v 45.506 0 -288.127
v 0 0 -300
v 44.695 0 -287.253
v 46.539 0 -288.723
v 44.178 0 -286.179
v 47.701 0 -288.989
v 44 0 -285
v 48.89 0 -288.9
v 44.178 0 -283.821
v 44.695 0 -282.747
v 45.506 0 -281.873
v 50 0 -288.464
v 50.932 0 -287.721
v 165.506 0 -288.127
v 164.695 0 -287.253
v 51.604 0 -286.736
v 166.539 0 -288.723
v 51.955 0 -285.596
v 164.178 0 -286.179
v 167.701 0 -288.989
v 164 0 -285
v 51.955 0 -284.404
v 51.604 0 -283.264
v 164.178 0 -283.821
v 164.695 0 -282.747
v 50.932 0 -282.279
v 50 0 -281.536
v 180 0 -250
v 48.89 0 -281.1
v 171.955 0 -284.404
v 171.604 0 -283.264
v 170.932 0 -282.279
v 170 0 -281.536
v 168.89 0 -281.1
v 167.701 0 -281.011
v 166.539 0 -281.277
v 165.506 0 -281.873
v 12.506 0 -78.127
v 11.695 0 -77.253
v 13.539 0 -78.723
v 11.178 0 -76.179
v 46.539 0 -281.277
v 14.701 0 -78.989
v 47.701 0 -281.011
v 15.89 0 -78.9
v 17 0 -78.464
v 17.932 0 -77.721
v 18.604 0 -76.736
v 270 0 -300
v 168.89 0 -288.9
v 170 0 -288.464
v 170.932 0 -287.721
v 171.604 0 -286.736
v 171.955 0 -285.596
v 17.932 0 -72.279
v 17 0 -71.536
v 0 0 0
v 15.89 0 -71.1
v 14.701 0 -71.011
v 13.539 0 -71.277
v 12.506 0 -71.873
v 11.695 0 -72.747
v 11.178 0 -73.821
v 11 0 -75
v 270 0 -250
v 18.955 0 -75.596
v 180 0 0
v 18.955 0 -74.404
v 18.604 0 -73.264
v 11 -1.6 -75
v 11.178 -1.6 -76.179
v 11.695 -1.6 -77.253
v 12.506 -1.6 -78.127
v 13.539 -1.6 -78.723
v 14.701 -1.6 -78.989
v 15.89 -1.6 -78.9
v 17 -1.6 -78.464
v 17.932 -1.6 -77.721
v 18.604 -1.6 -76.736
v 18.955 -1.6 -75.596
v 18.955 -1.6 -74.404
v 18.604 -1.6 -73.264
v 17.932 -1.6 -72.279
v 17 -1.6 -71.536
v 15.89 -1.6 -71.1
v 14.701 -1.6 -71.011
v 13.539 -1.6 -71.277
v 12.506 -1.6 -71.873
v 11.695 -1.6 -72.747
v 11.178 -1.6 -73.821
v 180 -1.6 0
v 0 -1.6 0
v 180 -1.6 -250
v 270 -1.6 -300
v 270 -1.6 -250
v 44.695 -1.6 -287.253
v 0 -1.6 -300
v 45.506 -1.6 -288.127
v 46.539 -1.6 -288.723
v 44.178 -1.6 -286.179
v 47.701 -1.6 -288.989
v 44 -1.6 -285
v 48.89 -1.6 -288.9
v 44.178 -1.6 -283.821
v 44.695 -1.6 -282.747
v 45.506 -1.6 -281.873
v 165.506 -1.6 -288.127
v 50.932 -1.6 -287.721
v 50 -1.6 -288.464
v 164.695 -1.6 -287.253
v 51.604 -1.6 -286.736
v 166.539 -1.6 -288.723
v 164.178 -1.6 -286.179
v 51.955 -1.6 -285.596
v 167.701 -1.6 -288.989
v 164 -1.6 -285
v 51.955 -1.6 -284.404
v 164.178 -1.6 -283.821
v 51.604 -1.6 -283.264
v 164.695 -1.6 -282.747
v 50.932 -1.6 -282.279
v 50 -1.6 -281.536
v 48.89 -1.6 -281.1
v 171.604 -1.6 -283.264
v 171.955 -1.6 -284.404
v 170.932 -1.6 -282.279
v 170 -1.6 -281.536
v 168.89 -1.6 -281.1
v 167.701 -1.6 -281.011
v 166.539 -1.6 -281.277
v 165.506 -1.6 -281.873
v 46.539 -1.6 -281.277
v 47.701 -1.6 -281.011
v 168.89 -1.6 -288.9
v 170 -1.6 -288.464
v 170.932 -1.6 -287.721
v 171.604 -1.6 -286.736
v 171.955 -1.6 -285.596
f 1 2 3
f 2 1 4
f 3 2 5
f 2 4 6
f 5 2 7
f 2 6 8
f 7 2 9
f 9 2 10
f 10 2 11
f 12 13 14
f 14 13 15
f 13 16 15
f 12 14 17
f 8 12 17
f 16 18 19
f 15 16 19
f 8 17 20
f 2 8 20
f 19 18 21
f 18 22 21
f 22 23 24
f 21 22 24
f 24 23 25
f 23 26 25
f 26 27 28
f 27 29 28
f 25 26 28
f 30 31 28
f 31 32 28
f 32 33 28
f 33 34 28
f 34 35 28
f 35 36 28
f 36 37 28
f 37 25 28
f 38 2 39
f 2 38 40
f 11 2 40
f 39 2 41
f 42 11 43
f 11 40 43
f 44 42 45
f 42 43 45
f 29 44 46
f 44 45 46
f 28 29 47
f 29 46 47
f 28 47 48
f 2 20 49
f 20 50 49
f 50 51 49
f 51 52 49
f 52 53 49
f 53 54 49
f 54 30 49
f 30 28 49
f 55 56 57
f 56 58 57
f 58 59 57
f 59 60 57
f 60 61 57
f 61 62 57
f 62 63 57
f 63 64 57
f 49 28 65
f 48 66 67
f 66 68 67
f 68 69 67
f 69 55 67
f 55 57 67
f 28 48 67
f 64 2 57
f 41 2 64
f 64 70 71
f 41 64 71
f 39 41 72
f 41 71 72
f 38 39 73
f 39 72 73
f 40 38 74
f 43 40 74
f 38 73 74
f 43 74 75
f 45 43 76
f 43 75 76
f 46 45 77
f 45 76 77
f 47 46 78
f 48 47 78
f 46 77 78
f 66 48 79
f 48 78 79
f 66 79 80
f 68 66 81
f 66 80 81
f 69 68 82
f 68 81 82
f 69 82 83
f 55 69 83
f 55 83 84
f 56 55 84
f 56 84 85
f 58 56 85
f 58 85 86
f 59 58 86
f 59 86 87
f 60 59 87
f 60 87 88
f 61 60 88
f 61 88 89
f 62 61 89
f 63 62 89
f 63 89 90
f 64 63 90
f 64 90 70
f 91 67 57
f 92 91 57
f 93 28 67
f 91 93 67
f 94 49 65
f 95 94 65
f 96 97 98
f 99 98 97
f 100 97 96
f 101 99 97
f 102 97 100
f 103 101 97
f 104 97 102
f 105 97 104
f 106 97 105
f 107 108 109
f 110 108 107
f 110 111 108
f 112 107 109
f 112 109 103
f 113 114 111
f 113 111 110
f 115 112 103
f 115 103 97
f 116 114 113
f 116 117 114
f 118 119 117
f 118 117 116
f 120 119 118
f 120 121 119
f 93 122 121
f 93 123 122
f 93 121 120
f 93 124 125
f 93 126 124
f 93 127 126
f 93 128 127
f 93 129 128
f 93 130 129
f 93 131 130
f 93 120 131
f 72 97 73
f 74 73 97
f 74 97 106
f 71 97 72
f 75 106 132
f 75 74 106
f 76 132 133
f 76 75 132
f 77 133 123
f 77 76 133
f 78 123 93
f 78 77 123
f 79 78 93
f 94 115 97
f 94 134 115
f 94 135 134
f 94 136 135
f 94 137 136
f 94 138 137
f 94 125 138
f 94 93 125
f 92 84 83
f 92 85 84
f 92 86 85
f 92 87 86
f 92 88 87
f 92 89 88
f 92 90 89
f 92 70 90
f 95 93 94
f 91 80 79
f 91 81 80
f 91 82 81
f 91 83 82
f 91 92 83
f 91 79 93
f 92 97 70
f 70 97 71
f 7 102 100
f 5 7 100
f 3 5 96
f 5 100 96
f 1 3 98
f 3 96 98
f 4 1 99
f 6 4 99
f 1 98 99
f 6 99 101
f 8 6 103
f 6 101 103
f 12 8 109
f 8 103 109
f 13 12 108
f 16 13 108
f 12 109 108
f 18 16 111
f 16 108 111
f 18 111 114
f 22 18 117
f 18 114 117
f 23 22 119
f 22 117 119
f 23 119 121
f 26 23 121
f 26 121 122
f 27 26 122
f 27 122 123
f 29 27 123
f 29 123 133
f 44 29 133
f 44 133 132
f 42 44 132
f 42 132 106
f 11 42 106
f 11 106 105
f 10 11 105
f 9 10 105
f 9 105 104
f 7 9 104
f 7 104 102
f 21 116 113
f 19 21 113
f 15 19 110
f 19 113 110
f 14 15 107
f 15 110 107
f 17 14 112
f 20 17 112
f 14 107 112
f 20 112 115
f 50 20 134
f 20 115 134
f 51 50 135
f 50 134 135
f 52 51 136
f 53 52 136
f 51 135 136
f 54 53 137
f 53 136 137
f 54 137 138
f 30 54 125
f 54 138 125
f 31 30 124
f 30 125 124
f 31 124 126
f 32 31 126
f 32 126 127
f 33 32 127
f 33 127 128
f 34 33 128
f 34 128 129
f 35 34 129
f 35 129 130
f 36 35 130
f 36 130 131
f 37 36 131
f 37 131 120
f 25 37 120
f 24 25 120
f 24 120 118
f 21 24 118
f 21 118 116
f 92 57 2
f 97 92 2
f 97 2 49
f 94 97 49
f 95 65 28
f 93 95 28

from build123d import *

# Parameters (mm, degrees)
F1_DEPTH = 1.6
F2_D     = 8


with BuildPart() as f1:
    # F0 (on Front) → F1 (new body)
    with BuildSketch(Plane.XZ):
        Polygon((180, 0), (0, 0), (0, -300), (270, -300), (270, -250), (180, -250), align=None)
    extrude(amount=F1_DEPTH)

    # F2 (through all)
    with Locations(Plane(origin=(0, 0, 0), x_dir=(1, 0, 0), z_dir=(0, 1, 0))):
        with Locations((15, 75), (48, 285), (168, 285)):
            Hole(F2_D / 2)


solid = f1.part
